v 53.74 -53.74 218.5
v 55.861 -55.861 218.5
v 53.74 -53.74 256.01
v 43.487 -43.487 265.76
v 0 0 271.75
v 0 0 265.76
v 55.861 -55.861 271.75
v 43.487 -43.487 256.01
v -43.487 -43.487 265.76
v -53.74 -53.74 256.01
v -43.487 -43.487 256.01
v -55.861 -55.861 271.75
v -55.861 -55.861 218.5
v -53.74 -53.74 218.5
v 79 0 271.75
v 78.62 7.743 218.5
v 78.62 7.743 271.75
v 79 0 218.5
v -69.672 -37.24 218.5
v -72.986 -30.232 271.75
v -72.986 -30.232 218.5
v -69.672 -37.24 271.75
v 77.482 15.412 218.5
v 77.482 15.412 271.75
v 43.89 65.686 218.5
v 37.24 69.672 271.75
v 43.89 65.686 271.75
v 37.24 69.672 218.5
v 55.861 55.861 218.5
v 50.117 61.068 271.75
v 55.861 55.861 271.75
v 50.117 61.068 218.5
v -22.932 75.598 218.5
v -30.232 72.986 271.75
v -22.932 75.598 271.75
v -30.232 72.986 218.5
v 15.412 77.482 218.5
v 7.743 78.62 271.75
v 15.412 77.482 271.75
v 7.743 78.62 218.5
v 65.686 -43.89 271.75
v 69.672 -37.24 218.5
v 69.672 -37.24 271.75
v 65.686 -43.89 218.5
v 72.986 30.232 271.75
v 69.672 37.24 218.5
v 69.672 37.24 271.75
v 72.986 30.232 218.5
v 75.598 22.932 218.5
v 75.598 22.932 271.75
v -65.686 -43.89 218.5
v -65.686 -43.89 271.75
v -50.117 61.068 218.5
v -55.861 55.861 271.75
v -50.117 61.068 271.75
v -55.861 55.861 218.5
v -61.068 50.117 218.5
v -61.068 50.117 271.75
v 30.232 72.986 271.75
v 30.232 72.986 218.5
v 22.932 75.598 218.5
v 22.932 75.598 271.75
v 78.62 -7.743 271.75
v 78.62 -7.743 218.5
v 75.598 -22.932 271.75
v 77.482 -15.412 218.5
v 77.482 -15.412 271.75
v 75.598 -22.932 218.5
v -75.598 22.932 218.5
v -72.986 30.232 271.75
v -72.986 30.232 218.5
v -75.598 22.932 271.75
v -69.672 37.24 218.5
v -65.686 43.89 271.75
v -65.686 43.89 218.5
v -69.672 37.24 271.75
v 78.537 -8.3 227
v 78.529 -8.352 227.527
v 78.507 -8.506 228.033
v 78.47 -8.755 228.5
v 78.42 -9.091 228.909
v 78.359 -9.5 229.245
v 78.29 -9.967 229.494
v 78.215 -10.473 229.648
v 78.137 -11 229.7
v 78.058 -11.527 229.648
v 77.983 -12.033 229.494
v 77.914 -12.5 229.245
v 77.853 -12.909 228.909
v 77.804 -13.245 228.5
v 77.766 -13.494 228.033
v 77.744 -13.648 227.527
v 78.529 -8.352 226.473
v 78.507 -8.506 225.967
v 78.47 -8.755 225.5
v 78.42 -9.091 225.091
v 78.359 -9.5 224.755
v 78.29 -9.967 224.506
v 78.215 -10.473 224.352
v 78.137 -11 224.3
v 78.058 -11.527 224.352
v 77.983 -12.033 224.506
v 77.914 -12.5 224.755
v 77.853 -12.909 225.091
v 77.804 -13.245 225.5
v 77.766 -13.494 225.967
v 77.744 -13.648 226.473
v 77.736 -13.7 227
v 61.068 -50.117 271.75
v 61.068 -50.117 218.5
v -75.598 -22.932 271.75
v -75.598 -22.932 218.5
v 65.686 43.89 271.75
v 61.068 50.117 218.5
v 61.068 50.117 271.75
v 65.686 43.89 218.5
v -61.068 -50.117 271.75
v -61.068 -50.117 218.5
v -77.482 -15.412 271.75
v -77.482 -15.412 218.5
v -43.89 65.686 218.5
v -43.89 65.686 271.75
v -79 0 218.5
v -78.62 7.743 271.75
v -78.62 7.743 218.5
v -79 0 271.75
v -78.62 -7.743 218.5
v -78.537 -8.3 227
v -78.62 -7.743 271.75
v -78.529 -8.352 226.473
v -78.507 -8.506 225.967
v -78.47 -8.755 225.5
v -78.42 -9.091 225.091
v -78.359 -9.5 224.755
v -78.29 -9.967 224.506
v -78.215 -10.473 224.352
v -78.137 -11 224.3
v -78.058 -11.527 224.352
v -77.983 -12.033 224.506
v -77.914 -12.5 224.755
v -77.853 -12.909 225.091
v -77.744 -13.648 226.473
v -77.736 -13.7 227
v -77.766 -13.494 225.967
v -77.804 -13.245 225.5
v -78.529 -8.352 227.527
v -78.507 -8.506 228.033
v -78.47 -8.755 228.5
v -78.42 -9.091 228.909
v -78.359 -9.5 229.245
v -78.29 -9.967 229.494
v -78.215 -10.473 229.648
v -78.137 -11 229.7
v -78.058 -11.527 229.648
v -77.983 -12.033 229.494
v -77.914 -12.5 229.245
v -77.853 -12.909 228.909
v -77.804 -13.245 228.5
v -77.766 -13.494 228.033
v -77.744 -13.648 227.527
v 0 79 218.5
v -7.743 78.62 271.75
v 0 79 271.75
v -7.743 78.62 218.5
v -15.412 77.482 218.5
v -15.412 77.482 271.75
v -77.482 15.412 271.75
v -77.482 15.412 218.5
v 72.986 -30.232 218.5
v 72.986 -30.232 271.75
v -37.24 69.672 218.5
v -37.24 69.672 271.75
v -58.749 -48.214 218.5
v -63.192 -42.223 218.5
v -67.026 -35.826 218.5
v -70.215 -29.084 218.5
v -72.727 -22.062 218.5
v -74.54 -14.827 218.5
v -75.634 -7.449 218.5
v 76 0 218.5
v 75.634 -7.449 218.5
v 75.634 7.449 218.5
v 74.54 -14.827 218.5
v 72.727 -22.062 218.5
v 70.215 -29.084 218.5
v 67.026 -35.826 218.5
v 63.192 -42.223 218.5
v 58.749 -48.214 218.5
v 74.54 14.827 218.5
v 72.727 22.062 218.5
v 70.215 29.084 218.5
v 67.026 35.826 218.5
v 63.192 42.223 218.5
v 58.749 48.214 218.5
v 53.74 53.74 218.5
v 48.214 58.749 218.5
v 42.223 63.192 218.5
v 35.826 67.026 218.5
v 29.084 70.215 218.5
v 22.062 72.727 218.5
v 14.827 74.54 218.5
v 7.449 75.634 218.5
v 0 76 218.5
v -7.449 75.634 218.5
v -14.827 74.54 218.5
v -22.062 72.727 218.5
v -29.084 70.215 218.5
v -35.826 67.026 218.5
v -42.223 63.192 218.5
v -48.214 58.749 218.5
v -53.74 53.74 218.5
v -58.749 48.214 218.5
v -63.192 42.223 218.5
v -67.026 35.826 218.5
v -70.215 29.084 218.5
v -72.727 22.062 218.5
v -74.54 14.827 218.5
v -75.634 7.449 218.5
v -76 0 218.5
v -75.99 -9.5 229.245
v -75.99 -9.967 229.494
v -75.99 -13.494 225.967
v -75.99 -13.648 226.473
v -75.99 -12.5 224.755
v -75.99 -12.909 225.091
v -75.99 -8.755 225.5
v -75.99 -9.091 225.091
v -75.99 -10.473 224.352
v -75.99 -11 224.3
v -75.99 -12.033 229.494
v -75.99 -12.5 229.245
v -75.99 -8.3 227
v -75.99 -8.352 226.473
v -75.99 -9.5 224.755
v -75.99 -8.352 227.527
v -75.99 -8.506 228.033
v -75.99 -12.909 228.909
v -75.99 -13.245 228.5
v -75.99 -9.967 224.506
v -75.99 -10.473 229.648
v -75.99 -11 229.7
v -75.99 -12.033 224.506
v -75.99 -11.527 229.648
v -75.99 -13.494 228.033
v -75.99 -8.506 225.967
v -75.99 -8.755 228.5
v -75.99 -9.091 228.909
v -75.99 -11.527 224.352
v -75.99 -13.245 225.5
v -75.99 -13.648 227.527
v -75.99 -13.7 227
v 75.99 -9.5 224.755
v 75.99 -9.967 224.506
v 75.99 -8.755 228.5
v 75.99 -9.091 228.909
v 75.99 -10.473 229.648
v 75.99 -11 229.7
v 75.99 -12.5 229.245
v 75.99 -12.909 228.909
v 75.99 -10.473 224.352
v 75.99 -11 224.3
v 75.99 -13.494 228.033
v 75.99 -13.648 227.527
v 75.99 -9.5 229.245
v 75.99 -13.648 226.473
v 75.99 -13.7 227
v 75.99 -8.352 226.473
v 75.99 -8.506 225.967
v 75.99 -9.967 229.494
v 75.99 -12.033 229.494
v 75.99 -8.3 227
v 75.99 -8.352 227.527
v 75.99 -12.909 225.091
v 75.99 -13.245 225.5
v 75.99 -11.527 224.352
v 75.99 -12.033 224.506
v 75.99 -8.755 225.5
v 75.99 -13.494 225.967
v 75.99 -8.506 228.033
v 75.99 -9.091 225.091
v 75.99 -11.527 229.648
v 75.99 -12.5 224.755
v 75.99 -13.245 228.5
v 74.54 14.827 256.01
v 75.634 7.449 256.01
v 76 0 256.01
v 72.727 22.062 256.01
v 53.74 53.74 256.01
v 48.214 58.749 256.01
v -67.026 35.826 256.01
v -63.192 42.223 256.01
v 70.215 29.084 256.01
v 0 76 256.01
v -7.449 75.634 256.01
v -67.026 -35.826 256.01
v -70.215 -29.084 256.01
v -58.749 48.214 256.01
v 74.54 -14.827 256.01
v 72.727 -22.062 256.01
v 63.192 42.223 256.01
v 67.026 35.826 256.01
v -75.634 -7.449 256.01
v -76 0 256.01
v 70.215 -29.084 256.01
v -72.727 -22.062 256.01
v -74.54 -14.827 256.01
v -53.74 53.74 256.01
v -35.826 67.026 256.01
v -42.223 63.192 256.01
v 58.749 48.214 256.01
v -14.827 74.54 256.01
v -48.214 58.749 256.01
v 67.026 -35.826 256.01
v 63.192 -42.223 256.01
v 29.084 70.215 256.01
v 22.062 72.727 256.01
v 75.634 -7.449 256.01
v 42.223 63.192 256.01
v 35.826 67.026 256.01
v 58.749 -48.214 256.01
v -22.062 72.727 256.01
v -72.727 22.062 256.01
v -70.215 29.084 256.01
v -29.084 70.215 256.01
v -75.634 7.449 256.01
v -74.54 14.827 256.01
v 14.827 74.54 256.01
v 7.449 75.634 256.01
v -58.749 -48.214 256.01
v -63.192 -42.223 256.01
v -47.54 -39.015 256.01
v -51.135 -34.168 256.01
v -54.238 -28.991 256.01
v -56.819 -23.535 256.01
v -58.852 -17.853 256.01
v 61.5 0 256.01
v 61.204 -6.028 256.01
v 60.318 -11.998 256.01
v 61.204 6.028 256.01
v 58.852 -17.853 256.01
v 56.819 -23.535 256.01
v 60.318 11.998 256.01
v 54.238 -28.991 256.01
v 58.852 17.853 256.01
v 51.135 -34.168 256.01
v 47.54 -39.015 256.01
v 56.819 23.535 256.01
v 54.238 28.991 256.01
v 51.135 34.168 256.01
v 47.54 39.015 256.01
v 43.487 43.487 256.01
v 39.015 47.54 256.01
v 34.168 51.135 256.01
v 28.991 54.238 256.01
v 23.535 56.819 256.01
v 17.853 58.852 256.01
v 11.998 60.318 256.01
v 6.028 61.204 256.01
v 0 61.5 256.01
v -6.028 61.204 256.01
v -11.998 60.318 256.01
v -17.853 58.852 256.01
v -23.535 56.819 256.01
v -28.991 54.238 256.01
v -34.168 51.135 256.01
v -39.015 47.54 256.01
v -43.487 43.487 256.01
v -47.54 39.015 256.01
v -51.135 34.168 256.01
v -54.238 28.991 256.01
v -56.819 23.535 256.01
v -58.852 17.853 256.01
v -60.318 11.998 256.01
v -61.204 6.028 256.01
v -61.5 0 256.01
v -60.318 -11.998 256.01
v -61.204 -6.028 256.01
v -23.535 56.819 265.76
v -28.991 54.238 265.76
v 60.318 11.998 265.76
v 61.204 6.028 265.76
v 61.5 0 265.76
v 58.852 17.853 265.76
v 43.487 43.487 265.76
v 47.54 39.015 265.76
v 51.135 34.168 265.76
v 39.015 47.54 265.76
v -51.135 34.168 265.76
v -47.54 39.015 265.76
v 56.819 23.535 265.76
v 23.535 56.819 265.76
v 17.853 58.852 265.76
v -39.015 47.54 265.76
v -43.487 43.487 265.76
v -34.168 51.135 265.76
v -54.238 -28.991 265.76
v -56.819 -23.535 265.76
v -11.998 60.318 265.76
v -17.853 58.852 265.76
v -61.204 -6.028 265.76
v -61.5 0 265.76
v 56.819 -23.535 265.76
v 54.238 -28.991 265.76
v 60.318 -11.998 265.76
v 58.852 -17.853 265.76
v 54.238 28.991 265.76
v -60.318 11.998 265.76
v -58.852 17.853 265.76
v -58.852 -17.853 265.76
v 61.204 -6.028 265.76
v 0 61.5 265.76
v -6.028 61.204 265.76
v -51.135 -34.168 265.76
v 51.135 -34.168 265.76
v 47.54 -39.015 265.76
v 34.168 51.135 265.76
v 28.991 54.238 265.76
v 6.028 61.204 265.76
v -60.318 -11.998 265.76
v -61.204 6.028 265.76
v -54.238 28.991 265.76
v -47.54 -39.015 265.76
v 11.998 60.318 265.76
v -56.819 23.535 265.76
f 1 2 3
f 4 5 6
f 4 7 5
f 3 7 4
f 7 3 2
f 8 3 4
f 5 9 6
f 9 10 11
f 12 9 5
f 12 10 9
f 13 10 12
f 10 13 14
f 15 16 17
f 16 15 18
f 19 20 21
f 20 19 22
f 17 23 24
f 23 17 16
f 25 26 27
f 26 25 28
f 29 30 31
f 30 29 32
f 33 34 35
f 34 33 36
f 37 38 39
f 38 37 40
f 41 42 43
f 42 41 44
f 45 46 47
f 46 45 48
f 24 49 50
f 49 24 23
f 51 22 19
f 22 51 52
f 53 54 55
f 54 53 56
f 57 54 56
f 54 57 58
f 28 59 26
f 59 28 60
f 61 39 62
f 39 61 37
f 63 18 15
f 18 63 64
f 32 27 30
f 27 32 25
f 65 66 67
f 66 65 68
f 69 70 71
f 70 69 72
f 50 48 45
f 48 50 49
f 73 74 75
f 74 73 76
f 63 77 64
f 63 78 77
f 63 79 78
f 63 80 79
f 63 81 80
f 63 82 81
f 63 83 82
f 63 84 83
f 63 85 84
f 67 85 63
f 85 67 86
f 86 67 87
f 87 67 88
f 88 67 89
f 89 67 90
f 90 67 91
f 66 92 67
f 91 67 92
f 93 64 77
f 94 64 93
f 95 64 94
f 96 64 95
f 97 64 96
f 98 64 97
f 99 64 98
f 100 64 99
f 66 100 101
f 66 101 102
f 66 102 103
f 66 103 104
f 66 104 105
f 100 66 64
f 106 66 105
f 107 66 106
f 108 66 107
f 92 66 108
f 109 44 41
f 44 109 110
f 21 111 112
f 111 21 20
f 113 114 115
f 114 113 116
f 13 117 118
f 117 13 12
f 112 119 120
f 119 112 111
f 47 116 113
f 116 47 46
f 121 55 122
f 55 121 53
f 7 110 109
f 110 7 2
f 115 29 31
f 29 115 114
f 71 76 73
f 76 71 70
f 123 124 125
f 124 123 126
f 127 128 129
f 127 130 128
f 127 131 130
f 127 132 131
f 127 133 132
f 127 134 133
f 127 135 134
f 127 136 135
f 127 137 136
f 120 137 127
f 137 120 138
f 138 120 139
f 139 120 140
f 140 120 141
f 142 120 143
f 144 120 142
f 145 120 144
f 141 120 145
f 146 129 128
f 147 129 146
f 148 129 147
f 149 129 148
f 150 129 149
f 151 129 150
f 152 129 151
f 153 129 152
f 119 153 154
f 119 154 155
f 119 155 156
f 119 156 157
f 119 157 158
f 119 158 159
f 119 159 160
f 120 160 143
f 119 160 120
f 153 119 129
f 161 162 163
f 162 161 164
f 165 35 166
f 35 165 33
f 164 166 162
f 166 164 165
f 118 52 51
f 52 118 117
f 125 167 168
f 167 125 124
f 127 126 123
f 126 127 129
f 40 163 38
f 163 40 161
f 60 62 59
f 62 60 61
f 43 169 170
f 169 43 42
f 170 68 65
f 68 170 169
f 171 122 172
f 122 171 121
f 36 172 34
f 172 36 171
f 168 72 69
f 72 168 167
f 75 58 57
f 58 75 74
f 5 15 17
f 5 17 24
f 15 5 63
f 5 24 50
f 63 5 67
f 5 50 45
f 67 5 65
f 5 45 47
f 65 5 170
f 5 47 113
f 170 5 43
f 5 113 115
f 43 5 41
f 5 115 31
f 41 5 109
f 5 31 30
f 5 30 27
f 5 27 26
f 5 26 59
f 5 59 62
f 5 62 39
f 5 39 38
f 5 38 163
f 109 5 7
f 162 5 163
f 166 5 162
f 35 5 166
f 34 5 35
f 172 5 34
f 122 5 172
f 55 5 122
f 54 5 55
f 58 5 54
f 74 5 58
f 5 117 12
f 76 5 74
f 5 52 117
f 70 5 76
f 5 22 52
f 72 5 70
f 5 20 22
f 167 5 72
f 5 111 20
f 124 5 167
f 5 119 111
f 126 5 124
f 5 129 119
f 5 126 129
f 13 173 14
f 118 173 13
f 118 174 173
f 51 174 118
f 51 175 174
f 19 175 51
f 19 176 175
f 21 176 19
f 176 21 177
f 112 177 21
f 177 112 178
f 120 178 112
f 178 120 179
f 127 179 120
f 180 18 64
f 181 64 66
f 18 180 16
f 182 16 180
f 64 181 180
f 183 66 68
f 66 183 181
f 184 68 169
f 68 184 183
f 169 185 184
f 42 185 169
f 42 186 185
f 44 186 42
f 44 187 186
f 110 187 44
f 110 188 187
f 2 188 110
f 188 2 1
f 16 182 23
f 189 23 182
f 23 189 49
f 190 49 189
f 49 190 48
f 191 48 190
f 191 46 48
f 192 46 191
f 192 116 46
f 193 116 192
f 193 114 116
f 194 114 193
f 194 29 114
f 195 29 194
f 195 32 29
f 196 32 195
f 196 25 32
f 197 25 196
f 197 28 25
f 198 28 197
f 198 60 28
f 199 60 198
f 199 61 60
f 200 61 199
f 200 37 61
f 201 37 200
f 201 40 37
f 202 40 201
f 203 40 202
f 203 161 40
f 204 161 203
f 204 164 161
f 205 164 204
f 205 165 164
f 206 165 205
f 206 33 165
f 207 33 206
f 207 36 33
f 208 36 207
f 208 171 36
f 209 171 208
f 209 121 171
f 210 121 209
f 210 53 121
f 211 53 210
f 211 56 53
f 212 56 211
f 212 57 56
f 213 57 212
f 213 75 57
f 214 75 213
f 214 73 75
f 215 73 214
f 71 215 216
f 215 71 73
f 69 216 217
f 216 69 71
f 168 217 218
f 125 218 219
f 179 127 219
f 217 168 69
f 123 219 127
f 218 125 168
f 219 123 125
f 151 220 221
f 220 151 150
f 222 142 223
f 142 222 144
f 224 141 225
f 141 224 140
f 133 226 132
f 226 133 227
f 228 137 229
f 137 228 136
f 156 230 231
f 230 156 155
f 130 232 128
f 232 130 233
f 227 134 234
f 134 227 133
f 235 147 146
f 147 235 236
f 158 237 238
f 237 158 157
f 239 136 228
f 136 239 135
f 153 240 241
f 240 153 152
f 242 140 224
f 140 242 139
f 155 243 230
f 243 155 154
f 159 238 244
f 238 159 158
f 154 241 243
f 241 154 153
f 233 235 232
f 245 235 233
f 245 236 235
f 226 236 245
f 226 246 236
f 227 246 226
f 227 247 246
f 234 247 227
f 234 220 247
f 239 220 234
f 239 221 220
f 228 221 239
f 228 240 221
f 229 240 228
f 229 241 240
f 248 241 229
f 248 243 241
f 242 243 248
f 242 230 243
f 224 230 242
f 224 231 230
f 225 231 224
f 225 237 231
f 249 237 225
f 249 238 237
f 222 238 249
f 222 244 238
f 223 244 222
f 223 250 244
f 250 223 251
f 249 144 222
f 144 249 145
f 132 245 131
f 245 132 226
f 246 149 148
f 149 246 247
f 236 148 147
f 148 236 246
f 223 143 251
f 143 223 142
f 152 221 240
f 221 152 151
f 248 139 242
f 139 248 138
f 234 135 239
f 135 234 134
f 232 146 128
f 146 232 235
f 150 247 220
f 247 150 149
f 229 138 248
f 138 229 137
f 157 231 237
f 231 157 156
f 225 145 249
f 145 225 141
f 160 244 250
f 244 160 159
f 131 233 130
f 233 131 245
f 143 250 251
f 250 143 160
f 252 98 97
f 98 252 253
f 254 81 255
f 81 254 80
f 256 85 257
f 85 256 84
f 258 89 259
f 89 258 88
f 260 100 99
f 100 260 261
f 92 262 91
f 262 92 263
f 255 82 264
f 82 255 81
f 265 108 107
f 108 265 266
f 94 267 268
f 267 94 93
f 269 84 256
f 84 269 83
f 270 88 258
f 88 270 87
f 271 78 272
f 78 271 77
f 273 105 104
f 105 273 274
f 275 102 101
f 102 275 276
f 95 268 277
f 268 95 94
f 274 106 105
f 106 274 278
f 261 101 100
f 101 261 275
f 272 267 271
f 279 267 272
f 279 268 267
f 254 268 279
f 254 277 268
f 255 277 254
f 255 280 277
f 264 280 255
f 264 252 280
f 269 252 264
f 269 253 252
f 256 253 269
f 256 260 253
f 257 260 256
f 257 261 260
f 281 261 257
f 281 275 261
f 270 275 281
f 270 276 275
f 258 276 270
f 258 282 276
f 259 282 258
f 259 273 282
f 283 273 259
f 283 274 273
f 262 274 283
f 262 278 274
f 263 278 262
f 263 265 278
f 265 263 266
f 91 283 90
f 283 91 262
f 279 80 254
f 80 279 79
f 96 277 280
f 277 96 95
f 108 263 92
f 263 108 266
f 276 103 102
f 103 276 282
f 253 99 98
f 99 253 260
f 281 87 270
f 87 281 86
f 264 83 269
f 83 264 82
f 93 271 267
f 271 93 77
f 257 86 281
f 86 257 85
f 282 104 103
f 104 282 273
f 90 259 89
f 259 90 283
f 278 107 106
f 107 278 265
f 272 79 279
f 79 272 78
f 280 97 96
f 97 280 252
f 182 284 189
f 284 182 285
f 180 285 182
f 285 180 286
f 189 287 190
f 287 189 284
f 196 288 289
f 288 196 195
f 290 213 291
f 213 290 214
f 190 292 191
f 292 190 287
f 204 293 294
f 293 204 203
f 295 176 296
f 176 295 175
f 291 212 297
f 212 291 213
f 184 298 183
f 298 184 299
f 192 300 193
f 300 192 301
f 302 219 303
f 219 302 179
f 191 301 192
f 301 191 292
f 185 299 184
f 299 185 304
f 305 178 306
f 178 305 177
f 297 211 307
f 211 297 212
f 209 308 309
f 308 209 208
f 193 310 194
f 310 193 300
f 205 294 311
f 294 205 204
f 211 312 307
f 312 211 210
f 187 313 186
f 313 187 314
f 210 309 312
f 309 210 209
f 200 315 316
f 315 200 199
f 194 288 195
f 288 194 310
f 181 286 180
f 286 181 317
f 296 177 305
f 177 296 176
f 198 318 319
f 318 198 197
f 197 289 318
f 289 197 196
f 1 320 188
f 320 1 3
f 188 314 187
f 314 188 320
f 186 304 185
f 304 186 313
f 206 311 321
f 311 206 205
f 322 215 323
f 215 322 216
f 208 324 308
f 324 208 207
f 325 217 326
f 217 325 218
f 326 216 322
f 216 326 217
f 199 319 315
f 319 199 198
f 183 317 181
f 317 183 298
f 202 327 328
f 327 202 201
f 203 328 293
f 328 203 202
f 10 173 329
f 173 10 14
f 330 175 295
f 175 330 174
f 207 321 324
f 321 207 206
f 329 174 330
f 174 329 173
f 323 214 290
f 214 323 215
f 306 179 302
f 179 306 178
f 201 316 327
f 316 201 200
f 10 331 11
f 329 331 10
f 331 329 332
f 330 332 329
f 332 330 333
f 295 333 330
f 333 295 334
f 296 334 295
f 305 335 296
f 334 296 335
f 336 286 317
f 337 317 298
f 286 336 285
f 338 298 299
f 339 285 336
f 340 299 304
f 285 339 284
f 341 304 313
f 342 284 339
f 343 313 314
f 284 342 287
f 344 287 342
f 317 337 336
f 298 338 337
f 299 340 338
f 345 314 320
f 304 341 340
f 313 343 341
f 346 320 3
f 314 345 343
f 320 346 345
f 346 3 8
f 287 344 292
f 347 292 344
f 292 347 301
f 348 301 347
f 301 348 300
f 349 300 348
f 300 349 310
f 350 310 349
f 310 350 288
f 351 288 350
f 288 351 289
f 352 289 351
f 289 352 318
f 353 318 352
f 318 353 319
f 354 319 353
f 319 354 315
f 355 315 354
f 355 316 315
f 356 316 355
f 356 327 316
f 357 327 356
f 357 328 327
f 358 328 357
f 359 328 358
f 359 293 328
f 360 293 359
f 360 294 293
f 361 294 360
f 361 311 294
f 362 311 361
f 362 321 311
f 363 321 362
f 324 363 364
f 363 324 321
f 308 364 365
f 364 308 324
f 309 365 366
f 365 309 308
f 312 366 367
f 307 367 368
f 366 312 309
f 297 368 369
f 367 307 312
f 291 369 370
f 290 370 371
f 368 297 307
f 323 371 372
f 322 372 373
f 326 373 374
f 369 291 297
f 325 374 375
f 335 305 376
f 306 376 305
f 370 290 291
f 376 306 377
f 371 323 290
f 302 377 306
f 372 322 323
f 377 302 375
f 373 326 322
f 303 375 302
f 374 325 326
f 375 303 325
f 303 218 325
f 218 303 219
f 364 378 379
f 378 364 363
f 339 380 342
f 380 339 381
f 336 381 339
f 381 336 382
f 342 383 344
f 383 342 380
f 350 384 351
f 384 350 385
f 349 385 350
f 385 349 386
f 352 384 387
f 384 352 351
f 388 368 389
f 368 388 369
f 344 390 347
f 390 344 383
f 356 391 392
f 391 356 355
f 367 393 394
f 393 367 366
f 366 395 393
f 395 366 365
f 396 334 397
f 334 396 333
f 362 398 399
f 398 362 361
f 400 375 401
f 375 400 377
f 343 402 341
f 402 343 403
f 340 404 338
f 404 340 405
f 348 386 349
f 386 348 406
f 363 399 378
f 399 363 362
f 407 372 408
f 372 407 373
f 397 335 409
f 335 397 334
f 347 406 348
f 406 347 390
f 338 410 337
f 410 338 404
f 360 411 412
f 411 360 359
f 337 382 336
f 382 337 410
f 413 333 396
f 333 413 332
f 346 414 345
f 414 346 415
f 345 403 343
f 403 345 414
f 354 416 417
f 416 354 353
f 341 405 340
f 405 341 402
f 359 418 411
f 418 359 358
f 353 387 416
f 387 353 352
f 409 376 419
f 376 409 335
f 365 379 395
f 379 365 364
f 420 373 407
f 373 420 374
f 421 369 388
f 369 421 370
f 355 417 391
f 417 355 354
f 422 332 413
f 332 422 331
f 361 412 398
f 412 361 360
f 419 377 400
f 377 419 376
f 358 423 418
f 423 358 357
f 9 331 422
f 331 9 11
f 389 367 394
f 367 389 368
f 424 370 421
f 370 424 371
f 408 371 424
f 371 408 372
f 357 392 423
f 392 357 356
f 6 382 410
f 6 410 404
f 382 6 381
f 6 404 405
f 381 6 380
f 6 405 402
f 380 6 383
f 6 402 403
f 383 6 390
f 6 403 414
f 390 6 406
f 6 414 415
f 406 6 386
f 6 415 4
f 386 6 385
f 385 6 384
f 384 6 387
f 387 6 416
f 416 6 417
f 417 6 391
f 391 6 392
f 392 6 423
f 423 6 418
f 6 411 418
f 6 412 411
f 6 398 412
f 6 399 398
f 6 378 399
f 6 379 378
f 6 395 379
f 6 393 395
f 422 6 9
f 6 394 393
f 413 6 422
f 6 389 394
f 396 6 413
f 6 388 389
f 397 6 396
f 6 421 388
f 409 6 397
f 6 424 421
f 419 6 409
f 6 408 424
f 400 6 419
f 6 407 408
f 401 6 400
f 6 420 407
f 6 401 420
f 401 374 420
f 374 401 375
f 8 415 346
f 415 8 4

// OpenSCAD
// =====================================================================
// child_dome_cap_transport.scad — 子機 輸送専用 ドーム頂点キャップ
//
// docs/子機外装_改善要件.md §3.5 (G2/G4, C3)。運用時は取り外す (ドーム内
// から LED で照らすため、上半球を覆わない)。輸送 (パッド入りハードケース)
// のときだけ被せ、ドーム頂点への打痕を防ぐ。
//
// 座標系: 機体グローバル (チューブ軸=Z, z=0 チューブ下端, +Y=前)。
// 取合い (二重定義):
//   ドーム (wte4_dome_cap, 仮値): 座面 z=208, 押えリング OD=120.3, リング高6
//     (リング上面 z=214)。アクリルドーム本体 OD = (dome_ir+dome_t)*2 = 94.5
//     (wte4_dome_cap_ref.scad の式)。頂点 z = 208 + dome_h(53.25仮) = 261.25。
//     クリアランス計算は要件の「ドーム OD 114.3」の記述より広い 123mm 径の
//     筒で覆っており、実測差を吸収できる方へ振ってある (要確認 参照)。
//   child_top_crown: カラー外径 r_out=75 (Ø150)、耳上端 z=256、耳外側面
//     x=±cap_bolt_x(75) の z=cap_bolt_z(227) に M5 熱圧入インサート ×2
//     (child_top_crown.scad と一致させること)
//   xdcr_socket 座 中心 (0,-75) — 後方カットアウトで避ける
//
// 固定: M5 ノブボルト ×2 (工具レス)。スカートのバカ穴 Ø5.4 から
// child_top_crown の M5 インサートへ。
//
// 荷重: L2 輸送 300N を天板中央で受ける (四辺 [円周] 支持相当、
// quick_strength plate --a 123 --b 123 --t 6 で 曲げ3.05MPa/たわみ0.71mm PASS)。
//
// 印刷: topopt print 実測で **-Y up** (モデルの Z 軸を横に倒す) が最良
// (オーバーハング 9.9%、cos=0 で主荷重は層面内)。天板を下にした素直な
// 逆さ置き (+Y up 相当、オーバーハング 8.1%・1層目 0mm2) も同等に成立する
// ので、スライサでどちらか支持要否の少ない方を選べばよい。いずれも
// X1C 250mm^3 枠に収まる (実寸 158 x 134.9 x 53.25)。
// =====================================================================

/* [ドームクリアランス]  座標は wte4_dome_cap の座面 (z=208) 基準の絶対値 */
dome_apex_z = 261.25;      // 座面(208) + dome_h(53.25仮)
cover_r     = 61.5;        // 内筒半径 (ID123)。実ドーム r47.25 に対し +14.25 の余裕
cover_wall  = 4;
cover_z0    = 256;         // = child_top_crown 耳上端 (skirt との段差位置)
cover_z1    = 265.75;      // 頂点(261.25)まで 4.5mm クリア
plate_t     = 6;           // quick_strength plate --a123 --b123 --t6 PASS

/* [スカート]  child_top_crown のカラー/耳の外径 (r_out=75, ear_x1=75) に外嵌め */
crown_r_out = 75;          // child_top_crown r_out / ear_x1 と二重定義
skirt_r     = 76;          // ID152 (クラウン外径 150 + 1mm×2 のクリアランス)
skirt_wall  = 3;           // OD158 (<=160 上限)
skirt_z0    = 218.5;       // ゲート頂面 z218 に触れない (スカート内腔の下端)

/* [後方カットアウト (child_top_crown と同じ、xdcr_socket/TD04A 逃げ)] */
aft_az0 = 225;
aft_az1 = 315;
xd_cx = 0;
xd_cy = -75;
xd_r_clear = 21;

/* [固定用 M5 ノブボルト (child_top_crown と二重定義)] */
cap_bolt_x = 75;
cap_bolt_y = -11;   // = child_top_crown 耳の y 中心 ((ear_y0+ear_y1)/2)
cap_bolt_z = 227;
knob_hole_d = 5.4;

/* [Hidden] */
fudge = 0.01;
$fn = 64;

// ---- 検査 --------------------------------------------------------------
assert(cover_r*2 - 2*47.25 >= 4, "ドーム側面クリアランス不足 (< 4mm)");
assert(cover_z1 - dome_apex_z >= 4, "ドーム頂点クリアランス不足 (< 4mm)");
assert(cover_z1 + plate_t <= 275, "キャップ上端が 275 を超える");
assert(2*(skirt_r + skirt_wall) <= 160, "キャップ外径が X1C 実用枠を超える");
assert(skirt_z0 >= 218.5, "スカート下端がゲート頂面に近すぎる (擦る)");
assert(skirt_r >= crown_r_out + 0.5, "スカートがクラウンに嵌らない");
assert(cap_bolt_z > skirt_z0 && cap_bolt_z < cover_z0, "ノブボルト位置がスカート内腔の外");
aft_edge_x = skirt_r * cos(aft_az0);
aft_edge_y = skirt_r * sin(aft_az0);
aft_edge_dist = sqrt(pow(aft_edge_x - xd_cx, 2) + pow(aft_edge_y - xd_cy, 2));
assert(aft_edge_dist >= xd_r_clear,
       str("アフトカットアウト端が xdcr_socket に近すぎる: ", aft_edge_dist));
echo(str("キャップ上端 z = ", cover_z1 + plate_t, " / ドーム頂点クリアランス = ", cover_z1 - dome_apex_z));

// ---- モジュール ----------------------------------------------------------
module wedge(az0, az1, z0, h) {
    intersection() {
        rotate([0, 0, az0]) translate([0, 0, z0]) cube([400, 400, h]);
        rotate([0, 0, az1 - 90]) translate([0, 0, z0 - fudge]) cube([400, 400, h + 2*fudge]);
    }
}

// ---- 形状 -----------------------------------------------------------
// 段差 (スカート/カバー) を別ソリッドで作ると z 境界で面同士が接するだけに
// なり CGAL の boolean union が別ソリッドとして分離することがあったため、
// **外殻を単一円筒 (OD 一定 = skirt_r+skirt_wall) で通し、内側のボア半径だけ
// 高さで変える** 構成にした (段差は内側だけ、外周は継ぎ目なし)。
top_z = cover_z1 + plate_t;
difference() {
    // 外殻 (単一円筒、後方カットアウトを全高で貫通させる)
    difference() {
        translate([0, 0, skirt_z0]) cylinder(r = skirt_r + skirt_wall, h = top_z - skirt_z0);
        wedge(aft_az0, aft_az1, skirt_z0 - fudge, (top_z - skirt_z0) + 2*fudge);
    }
    // スカート内腔 (クラウンとの嵌合クリアランス、z218.5..cover_z0)
    translate([0, 0, skirt_z0 - fudge]) cylinder(r = skirt_r, h = (cover_z0 - skirt_z0) + 2*fudge);
    // 内筒の内腔 (ドームクリアランス、z cover_z0..cover_z1)
    translate([0, 0, cover_z0 - fudge]) cylinder(r = cover_r, h = (cover_z1 - cover_z0) + 2*fudge);
    // ノブボルト バカ穴 ×2 (軸 X)
    for (sx = [-1, 1])
        translate([sx * (skirt_r + skirt_wall + fudge), cap_bolt_y, cap_bolt_z])
            rotate([0, -90 * sx, 0]) cylinder(d = knob_hole_d, h = skirt_wall + 2*fudge, $fn = 32);
}
